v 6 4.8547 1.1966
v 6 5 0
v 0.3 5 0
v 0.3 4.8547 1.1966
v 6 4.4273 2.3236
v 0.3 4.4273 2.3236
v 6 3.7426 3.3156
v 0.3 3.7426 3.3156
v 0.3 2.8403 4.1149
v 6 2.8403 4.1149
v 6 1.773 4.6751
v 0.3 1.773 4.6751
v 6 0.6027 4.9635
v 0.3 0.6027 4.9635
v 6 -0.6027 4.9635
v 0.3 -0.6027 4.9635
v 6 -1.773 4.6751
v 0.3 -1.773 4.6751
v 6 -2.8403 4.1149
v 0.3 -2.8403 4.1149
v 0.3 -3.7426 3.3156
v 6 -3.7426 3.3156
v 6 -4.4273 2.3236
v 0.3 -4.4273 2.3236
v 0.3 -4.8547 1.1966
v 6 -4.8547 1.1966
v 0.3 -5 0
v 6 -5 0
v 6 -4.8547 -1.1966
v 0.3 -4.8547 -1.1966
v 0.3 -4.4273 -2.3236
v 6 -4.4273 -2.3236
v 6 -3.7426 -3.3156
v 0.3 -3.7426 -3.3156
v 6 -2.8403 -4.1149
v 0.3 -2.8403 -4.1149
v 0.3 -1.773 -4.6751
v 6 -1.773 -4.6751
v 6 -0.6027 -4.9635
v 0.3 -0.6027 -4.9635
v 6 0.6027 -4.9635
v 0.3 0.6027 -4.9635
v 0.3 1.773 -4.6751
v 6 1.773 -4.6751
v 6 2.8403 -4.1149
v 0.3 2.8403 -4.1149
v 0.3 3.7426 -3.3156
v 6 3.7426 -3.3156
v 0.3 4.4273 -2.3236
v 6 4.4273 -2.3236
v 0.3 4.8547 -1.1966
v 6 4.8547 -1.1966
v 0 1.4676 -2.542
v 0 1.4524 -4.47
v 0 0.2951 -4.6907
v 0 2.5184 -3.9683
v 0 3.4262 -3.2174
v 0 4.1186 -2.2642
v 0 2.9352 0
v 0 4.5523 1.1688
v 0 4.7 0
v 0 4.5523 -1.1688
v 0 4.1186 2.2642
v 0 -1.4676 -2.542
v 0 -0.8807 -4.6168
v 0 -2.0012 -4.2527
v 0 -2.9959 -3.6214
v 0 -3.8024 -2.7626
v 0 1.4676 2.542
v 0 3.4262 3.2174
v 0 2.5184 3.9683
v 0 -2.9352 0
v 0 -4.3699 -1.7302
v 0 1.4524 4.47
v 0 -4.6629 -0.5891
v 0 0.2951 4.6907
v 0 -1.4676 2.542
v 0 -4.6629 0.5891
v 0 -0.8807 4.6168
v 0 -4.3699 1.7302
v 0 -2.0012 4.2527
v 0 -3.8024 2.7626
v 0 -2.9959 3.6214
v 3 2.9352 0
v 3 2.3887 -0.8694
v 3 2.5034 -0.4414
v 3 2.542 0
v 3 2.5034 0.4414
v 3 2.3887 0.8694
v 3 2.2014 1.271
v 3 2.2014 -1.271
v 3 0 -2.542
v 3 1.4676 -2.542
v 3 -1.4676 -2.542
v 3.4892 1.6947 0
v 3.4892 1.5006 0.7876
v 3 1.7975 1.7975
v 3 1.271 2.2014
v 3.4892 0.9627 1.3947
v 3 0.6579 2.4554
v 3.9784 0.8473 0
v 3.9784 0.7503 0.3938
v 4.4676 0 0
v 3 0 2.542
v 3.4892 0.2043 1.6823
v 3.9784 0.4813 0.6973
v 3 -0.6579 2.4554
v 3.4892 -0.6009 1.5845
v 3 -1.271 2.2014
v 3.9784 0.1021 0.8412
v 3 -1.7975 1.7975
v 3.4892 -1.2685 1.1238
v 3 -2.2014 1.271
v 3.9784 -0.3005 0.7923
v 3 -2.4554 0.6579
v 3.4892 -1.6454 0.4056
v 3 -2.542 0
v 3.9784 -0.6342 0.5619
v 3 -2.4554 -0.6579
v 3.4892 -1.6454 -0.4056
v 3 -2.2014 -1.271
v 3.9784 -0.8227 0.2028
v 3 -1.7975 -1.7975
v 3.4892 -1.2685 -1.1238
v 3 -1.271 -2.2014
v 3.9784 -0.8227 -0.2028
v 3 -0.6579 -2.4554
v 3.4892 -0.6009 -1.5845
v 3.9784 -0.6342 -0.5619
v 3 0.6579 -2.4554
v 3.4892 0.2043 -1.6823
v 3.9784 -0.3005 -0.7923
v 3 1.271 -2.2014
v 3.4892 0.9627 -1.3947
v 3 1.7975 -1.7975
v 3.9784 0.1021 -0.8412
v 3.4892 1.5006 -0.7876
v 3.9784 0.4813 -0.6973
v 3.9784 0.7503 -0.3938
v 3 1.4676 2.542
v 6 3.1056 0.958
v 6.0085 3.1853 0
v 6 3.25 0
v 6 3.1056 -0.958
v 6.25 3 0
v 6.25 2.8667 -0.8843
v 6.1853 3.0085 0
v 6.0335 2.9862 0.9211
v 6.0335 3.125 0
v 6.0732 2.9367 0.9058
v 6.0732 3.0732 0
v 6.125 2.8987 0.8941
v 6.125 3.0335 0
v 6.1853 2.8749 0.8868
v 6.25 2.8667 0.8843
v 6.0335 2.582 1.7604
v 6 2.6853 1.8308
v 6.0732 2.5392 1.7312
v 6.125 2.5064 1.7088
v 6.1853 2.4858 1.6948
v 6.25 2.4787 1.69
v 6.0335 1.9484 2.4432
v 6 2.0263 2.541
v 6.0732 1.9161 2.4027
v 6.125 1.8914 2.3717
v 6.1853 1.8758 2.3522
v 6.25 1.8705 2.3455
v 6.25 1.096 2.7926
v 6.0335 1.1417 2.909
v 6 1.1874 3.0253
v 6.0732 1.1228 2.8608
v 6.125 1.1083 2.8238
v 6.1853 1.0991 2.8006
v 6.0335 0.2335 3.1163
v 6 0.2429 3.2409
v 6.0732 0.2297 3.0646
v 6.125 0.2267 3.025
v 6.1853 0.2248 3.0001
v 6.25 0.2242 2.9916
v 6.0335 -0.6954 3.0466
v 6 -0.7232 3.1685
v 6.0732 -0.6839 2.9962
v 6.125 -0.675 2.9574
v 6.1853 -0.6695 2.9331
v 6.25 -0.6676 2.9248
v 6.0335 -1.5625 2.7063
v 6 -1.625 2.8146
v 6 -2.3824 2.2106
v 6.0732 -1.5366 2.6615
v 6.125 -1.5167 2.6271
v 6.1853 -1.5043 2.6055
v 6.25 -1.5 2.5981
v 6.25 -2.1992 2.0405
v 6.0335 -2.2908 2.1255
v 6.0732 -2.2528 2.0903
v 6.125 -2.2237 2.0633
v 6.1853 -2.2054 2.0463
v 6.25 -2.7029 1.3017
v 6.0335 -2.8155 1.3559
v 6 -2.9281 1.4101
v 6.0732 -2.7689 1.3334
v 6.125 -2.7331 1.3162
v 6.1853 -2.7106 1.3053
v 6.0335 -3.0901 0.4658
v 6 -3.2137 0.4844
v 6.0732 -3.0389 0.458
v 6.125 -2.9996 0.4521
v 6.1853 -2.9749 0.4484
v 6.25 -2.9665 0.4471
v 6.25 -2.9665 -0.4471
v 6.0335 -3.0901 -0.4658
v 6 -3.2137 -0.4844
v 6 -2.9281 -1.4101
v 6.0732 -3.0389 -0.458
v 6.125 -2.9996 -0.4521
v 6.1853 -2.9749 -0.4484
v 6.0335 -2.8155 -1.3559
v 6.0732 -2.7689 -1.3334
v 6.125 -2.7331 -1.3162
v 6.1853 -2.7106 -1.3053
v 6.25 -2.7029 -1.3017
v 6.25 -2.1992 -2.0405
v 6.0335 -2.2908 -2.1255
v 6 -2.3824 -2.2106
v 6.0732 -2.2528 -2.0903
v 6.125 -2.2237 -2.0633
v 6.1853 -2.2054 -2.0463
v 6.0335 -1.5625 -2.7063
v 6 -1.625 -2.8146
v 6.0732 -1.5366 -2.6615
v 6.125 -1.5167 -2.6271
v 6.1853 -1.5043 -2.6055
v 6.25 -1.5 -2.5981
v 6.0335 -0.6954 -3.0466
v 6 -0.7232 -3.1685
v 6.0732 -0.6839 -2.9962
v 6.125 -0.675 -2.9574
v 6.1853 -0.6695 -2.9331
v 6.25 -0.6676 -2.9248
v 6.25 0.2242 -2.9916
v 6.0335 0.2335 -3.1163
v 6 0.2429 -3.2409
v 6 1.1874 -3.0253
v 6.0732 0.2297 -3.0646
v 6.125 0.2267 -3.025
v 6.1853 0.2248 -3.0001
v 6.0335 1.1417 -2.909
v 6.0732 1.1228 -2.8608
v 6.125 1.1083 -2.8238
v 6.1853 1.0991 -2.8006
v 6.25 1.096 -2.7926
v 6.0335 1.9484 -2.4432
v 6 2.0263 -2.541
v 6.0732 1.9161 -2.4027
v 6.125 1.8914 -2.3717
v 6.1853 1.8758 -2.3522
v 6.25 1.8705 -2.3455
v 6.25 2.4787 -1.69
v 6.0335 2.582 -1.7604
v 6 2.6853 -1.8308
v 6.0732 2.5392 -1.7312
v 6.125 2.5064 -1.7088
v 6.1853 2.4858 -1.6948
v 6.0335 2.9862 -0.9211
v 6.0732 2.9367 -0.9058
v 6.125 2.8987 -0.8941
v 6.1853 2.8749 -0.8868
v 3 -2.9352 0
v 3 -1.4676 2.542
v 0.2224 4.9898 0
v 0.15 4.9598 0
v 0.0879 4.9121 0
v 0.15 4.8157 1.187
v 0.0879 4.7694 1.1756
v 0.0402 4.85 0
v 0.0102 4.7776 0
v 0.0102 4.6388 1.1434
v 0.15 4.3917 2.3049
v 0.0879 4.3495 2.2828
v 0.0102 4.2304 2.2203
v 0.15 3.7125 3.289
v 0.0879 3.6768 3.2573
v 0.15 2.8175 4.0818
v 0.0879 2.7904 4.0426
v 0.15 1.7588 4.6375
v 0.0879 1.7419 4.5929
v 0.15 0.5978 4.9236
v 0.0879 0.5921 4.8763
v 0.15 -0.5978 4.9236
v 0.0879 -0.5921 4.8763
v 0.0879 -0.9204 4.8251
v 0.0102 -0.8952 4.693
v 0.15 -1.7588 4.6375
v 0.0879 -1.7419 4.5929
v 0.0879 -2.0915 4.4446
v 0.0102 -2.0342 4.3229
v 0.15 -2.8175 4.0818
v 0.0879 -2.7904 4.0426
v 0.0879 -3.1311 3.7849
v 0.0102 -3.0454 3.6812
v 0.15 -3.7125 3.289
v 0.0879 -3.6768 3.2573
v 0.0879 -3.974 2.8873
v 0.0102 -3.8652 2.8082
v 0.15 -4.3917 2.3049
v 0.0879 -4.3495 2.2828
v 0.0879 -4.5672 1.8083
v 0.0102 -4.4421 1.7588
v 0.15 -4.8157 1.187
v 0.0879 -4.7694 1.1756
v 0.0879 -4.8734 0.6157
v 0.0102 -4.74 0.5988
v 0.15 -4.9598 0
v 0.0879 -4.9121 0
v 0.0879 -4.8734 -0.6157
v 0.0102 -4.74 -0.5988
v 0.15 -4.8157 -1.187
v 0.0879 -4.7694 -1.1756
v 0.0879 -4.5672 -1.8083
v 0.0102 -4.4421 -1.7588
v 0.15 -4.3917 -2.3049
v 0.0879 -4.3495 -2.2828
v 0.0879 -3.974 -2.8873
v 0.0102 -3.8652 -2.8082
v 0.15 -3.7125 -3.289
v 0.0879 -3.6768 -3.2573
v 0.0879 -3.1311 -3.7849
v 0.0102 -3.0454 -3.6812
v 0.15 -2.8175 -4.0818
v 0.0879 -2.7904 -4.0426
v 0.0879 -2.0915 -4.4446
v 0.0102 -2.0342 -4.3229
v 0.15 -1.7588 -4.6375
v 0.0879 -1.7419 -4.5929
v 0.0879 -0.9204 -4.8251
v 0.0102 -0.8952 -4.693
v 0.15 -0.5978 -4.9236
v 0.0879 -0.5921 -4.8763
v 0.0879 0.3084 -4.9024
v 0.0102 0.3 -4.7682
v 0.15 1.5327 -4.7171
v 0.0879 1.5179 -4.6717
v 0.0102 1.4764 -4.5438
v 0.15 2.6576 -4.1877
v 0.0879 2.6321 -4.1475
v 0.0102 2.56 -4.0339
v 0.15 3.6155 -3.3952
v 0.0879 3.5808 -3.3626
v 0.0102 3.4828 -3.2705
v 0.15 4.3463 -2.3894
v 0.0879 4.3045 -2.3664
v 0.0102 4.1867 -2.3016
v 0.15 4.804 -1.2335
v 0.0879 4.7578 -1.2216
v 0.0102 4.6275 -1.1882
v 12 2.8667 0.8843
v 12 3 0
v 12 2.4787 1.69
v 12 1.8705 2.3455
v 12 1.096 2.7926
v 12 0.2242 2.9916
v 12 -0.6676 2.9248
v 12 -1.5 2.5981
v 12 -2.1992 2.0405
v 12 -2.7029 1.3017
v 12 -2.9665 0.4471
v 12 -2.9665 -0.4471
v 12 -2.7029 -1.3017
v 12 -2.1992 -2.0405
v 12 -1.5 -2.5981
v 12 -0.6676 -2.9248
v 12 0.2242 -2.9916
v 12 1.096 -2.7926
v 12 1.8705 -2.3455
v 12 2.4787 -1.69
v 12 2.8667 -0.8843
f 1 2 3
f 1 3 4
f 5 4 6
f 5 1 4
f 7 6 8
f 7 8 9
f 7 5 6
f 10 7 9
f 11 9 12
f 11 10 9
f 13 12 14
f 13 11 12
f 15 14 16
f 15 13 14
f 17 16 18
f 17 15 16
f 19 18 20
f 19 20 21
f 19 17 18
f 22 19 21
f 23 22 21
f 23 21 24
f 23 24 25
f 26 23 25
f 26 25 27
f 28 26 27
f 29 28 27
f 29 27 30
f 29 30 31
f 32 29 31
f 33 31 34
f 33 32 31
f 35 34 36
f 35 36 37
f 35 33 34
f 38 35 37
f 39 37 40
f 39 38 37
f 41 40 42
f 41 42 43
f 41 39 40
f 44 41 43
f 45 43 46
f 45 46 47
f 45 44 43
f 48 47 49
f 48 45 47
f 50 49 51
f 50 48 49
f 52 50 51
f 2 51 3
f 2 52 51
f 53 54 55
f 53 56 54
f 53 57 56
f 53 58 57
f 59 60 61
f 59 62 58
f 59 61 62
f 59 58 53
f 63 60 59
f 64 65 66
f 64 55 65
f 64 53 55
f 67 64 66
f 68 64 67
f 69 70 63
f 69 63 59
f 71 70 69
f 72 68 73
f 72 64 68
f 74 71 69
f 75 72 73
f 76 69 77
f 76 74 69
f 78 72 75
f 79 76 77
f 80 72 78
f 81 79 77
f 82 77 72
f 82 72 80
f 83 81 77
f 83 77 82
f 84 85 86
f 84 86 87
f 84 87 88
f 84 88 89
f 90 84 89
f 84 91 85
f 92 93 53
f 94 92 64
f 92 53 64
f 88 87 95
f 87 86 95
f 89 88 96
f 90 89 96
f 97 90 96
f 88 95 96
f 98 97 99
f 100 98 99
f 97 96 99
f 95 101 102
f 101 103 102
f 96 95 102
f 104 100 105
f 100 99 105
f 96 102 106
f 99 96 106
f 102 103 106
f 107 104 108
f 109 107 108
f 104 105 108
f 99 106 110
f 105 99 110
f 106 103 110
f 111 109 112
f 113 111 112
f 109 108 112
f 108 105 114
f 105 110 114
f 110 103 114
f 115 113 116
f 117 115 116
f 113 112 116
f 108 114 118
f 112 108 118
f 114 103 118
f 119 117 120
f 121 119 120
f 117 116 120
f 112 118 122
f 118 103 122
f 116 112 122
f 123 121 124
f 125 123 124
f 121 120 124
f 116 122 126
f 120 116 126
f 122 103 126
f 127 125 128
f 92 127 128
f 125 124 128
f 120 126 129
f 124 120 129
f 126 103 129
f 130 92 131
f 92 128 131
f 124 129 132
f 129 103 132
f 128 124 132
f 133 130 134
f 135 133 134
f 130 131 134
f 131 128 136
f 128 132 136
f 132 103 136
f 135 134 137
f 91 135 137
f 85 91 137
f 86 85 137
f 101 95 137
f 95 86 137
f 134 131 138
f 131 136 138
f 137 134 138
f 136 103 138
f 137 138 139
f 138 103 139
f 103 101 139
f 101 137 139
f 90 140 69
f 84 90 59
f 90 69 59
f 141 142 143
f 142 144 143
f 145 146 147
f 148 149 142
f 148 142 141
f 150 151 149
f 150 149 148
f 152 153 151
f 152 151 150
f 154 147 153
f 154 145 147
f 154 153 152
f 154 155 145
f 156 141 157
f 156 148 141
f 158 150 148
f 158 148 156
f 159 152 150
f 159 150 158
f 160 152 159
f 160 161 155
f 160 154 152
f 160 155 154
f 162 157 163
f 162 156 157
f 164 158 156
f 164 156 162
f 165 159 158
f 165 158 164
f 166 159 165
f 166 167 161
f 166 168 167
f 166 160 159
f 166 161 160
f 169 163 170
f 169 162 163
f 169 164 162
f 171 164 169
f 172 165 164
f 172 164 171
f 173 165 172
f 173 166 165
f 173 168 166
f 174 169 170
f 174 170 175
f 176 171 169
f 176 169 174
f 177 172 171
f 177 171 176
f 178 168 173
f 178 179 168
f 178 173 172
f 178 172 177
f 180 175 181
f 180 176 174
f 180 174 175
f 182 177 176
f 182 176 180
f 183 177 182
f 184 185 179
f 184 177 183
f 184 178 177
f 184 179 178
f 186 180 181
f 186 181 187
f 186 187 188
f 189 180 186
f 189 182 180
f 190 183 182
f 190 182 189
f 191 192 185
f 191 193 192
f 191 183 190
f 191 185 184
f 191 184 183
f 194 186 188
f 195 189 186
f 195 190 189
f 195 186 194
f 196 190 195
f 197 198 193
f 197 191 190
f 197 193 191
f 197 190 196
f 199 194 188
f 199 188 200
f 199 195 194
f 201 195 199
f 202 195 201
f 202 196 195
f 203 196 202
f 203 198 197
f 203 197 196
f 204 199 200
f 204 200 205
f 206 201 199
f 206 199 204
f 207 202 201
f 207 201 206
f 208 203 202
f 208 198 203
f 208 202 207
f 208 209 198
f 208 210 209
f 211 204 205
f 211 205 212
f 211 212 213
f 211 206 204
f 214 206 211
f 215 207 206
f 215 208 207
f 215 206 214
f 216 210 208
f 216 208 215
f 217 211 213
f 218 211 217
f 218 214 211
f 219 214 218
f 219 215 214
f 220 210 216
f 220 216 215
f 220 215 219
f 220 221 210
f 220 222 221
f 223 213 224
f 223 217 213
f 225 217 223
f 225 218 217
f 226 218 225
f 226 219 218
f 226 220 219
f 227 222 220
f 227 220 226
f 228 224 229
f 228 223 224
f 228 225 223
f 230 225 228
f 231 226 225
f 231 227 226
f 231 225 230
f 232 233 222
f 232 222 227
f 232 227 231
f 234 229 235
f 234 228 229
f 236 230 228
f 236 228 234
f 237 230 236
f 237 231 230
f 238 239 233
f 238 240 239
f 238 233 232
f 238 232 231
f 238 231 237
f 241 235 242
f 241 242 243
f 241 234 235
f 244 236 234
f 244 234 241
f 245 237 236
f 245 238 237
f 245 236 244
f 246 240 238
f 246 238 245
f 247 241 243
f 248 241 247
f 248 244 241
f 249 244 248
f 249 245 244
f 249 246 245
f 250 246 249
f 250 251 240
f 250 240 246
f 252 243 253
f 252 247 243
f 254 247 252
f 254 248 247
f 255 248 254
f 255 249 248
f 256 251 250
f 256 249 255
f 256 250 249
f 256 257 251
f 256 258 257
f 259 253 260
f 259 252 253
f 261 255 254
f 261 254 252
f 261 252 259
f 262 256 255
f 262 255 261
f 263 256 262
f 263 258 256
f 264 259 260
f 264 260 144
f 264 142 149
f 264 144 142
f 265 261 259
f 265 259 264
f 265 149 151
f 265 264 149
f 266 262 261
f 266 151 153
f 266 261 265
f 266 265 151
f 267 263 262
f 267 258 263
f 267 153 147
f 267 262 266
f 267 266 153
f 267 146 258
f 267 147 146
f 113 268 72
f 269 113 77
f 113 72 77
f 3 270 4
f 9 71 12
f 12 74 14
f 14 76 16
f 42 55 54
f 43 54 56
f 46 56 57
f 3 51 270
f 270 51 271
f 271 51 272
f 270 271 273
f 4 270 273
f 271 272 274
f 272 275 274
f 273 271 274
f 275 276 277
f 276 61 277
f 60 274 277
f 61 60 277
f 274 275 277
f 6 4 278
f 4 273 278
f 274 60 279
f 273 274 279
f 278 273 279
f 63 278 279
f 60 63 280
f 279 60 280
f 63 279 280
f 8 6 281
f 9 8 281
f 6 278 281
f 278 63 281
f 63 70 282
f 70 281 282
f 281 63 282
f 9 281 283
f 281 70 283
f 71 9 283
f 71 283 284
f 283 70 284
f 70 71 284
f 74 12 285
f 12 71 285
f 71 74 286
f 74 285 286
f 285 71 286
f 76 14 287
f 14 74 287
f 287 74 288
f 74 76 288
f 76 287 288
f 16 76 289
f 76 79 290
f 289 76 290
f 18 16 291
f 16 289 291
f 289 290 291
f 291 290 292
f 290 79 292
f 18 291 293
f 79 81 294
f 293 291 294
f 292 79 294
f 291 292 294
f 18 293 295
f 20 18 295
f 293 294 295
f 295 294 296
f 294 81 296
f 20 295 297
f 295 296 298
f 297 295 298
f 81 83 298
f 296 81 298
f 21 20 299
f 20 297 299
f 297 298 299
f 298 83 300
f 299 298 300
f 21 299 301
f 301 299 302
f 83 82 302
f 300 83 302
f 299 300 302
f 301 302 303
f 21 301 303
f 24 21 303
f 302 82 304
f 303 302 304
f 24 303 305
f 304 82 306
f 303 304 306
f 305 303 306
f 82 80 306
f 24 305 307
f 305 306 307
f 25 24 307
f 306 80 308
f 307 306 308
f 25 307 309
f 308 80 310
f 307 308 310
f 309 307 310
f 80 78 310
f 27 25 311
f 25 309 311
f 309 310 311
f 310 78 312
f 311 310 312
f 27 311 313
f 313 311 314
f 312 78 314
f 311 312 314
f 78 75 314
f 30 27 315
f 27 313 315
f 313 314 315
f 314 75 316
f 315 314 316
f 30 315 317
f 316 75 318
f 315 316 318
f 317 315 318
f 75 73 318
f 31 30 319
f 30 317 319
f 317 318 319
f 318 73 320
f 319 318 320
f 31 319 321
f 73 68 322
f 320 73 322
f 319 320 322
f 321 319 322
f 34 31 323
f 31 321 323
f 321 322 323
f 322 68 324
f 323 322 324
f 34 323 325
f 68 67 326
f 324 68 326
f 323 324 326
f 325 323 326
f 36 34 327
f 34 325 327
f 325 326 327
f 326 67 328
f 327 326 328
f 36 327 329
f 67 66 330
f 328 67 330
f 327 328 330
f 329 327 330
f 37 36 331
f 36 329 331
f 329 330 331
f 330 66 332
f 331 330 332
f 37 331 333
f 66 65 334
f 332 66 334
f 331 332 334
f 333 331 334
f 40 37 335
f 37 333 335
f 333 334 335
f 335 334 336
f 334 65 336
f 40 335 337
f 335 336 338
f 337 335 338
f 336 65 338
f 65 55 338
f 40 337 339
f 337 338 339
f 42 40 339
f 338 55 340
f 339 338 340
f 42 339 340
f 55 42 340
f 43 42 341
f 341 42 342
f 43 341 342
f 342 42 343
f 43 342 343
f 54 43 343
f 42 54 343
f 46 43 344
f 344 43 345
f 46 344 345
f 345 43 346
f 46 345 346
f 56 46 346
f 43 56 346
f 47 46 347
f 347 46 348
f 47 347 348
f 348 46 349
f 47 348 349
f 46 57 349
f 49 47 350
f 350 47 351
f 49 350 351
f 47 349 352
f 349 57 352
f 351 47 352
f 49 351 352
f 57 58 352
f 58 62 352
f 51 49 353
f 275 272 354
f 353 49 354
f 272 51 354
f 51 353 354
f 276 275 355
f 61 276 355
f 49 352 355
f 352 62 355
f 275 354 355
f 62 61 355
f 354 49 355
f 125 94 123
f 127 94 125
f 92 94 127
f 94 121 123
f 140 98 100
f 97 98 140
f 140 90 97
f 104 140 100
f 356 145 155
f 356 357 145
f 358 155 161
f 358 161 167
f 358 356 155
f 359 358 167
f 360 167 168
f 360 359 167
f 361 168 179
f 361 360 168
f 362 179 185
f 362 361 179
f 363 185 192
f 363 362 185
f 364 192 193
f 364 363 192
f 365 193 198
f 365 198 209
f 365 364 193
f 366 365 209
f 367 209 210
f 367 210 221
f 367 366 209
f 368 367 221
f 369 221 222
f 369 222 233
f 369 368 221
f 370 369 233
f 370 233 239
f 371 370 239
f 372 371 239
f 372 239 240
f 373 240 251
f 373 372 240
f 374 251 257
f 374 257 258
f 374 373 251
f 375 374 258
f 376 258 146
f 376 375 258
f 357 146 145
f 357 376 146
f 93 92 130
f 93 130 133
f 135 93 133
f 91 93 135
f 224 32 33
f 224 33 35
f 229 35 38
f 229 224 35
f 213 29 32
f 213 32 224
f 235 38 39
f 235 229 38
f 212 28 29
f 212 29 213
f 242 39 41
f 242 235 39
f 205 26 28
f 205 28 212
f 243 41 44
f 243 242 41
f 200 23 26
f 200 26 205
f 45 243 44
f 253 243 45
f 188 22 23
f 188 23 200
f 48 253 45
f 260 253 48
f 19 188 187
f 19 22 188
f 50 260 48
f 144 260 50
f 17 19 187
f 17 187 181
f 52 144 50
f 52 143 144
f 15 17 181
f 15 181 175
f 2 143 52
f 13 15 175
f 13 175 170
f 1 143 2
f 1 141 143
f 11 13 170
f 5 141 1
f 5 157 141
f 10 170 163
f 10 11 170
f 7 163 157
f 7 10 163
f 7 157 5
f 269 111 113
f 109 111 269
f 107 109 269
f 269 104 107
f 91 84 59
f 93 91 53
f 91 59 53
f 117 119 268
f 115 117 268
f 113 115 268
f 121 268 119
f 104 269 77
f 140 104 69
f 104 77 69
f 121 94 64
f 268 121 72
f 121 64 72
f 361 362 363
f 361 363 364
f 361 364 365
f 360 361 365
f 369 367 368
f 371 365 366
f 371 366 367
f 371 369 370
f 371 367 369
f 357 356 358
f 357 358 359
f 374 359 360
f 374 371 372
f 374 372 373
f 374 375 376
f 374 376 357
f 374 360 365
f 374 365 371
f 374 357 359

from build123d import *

# Parameters (mm, degrees)
FILLET1_R          = 0.25
FILLET2_R          = 0.3
HEX_2_DEPTH        = 3
SKETCH4_R          = 7.875730731
CUT_EXTRUDE1_DEPTH = 4


with BuildPart() as part:
    # BodySke → Base-Revolve (revolve)
    with BuildSketch(Plane.XY):
        Polygon((0, 0), (0, 5), (6, 5), (6, 3), (15.4455, 3), (16, 2.4455), (16, 0), align=None)
    revolve(axis=Axis((-31.75, 0, 0), (1, 0, 0)))

    # Fillet1
    fillet1_edges = [part.edges().sort_by_distance(p)[0] for p in [
        (6, -3, 0),
    ]]
    fillet(fillet1_edges, radius=FILLET1_R)

    # Fillet2
    fillet2_edges = [part.edges().sort_by_distance(p)[0] for p in [
        (0, -5, 0),
    ]]
    fillet(fillet2_edges, radius=FILLET2_R)

    # Sketch2 → Hex-PreBroach (revolve, cut)
    with BuildSketch(Plane.XY):
        Polygon((0, 2.542), (3, 2.542), (4.467624384, 0), (0, 0), align=None)
    revolve(axis=Axis((0, 0, 0), (1, 0, 0)), mode=Mode.SUBTRACT)

    # Sketch3 → Hex 2 (cut)
    with BuildSketch(Plane(origin=(0, 0, 0), x_dir=(0, 0.5, 0.866025404), z_dir=(-1, 0, 0))):
        Polygon((1.467624384, 2.542), (-1.467624384, 2.542), (-2.935248769, 0), (-1.467624384, -2.542), (1.467624384, -2.542), (2.935248769, 0), align=None)
    extrude(amount=-HEX_2_DEPTH, mode=Mode.SUBTRACT)

    # Sketch4 → Cut-Extrude1 (cut)
    with BuildSketch(Plane(origin=(16, 0, 0), x_dir=(0, 0, -1), z_dir=(1, 0, 0))):
        Circle(SKETCH4_R)
    extrude(amount=-CUT_EXTRUDE1_DEPTH, mode=Mode.SUBTRACT)


solid = part.part
